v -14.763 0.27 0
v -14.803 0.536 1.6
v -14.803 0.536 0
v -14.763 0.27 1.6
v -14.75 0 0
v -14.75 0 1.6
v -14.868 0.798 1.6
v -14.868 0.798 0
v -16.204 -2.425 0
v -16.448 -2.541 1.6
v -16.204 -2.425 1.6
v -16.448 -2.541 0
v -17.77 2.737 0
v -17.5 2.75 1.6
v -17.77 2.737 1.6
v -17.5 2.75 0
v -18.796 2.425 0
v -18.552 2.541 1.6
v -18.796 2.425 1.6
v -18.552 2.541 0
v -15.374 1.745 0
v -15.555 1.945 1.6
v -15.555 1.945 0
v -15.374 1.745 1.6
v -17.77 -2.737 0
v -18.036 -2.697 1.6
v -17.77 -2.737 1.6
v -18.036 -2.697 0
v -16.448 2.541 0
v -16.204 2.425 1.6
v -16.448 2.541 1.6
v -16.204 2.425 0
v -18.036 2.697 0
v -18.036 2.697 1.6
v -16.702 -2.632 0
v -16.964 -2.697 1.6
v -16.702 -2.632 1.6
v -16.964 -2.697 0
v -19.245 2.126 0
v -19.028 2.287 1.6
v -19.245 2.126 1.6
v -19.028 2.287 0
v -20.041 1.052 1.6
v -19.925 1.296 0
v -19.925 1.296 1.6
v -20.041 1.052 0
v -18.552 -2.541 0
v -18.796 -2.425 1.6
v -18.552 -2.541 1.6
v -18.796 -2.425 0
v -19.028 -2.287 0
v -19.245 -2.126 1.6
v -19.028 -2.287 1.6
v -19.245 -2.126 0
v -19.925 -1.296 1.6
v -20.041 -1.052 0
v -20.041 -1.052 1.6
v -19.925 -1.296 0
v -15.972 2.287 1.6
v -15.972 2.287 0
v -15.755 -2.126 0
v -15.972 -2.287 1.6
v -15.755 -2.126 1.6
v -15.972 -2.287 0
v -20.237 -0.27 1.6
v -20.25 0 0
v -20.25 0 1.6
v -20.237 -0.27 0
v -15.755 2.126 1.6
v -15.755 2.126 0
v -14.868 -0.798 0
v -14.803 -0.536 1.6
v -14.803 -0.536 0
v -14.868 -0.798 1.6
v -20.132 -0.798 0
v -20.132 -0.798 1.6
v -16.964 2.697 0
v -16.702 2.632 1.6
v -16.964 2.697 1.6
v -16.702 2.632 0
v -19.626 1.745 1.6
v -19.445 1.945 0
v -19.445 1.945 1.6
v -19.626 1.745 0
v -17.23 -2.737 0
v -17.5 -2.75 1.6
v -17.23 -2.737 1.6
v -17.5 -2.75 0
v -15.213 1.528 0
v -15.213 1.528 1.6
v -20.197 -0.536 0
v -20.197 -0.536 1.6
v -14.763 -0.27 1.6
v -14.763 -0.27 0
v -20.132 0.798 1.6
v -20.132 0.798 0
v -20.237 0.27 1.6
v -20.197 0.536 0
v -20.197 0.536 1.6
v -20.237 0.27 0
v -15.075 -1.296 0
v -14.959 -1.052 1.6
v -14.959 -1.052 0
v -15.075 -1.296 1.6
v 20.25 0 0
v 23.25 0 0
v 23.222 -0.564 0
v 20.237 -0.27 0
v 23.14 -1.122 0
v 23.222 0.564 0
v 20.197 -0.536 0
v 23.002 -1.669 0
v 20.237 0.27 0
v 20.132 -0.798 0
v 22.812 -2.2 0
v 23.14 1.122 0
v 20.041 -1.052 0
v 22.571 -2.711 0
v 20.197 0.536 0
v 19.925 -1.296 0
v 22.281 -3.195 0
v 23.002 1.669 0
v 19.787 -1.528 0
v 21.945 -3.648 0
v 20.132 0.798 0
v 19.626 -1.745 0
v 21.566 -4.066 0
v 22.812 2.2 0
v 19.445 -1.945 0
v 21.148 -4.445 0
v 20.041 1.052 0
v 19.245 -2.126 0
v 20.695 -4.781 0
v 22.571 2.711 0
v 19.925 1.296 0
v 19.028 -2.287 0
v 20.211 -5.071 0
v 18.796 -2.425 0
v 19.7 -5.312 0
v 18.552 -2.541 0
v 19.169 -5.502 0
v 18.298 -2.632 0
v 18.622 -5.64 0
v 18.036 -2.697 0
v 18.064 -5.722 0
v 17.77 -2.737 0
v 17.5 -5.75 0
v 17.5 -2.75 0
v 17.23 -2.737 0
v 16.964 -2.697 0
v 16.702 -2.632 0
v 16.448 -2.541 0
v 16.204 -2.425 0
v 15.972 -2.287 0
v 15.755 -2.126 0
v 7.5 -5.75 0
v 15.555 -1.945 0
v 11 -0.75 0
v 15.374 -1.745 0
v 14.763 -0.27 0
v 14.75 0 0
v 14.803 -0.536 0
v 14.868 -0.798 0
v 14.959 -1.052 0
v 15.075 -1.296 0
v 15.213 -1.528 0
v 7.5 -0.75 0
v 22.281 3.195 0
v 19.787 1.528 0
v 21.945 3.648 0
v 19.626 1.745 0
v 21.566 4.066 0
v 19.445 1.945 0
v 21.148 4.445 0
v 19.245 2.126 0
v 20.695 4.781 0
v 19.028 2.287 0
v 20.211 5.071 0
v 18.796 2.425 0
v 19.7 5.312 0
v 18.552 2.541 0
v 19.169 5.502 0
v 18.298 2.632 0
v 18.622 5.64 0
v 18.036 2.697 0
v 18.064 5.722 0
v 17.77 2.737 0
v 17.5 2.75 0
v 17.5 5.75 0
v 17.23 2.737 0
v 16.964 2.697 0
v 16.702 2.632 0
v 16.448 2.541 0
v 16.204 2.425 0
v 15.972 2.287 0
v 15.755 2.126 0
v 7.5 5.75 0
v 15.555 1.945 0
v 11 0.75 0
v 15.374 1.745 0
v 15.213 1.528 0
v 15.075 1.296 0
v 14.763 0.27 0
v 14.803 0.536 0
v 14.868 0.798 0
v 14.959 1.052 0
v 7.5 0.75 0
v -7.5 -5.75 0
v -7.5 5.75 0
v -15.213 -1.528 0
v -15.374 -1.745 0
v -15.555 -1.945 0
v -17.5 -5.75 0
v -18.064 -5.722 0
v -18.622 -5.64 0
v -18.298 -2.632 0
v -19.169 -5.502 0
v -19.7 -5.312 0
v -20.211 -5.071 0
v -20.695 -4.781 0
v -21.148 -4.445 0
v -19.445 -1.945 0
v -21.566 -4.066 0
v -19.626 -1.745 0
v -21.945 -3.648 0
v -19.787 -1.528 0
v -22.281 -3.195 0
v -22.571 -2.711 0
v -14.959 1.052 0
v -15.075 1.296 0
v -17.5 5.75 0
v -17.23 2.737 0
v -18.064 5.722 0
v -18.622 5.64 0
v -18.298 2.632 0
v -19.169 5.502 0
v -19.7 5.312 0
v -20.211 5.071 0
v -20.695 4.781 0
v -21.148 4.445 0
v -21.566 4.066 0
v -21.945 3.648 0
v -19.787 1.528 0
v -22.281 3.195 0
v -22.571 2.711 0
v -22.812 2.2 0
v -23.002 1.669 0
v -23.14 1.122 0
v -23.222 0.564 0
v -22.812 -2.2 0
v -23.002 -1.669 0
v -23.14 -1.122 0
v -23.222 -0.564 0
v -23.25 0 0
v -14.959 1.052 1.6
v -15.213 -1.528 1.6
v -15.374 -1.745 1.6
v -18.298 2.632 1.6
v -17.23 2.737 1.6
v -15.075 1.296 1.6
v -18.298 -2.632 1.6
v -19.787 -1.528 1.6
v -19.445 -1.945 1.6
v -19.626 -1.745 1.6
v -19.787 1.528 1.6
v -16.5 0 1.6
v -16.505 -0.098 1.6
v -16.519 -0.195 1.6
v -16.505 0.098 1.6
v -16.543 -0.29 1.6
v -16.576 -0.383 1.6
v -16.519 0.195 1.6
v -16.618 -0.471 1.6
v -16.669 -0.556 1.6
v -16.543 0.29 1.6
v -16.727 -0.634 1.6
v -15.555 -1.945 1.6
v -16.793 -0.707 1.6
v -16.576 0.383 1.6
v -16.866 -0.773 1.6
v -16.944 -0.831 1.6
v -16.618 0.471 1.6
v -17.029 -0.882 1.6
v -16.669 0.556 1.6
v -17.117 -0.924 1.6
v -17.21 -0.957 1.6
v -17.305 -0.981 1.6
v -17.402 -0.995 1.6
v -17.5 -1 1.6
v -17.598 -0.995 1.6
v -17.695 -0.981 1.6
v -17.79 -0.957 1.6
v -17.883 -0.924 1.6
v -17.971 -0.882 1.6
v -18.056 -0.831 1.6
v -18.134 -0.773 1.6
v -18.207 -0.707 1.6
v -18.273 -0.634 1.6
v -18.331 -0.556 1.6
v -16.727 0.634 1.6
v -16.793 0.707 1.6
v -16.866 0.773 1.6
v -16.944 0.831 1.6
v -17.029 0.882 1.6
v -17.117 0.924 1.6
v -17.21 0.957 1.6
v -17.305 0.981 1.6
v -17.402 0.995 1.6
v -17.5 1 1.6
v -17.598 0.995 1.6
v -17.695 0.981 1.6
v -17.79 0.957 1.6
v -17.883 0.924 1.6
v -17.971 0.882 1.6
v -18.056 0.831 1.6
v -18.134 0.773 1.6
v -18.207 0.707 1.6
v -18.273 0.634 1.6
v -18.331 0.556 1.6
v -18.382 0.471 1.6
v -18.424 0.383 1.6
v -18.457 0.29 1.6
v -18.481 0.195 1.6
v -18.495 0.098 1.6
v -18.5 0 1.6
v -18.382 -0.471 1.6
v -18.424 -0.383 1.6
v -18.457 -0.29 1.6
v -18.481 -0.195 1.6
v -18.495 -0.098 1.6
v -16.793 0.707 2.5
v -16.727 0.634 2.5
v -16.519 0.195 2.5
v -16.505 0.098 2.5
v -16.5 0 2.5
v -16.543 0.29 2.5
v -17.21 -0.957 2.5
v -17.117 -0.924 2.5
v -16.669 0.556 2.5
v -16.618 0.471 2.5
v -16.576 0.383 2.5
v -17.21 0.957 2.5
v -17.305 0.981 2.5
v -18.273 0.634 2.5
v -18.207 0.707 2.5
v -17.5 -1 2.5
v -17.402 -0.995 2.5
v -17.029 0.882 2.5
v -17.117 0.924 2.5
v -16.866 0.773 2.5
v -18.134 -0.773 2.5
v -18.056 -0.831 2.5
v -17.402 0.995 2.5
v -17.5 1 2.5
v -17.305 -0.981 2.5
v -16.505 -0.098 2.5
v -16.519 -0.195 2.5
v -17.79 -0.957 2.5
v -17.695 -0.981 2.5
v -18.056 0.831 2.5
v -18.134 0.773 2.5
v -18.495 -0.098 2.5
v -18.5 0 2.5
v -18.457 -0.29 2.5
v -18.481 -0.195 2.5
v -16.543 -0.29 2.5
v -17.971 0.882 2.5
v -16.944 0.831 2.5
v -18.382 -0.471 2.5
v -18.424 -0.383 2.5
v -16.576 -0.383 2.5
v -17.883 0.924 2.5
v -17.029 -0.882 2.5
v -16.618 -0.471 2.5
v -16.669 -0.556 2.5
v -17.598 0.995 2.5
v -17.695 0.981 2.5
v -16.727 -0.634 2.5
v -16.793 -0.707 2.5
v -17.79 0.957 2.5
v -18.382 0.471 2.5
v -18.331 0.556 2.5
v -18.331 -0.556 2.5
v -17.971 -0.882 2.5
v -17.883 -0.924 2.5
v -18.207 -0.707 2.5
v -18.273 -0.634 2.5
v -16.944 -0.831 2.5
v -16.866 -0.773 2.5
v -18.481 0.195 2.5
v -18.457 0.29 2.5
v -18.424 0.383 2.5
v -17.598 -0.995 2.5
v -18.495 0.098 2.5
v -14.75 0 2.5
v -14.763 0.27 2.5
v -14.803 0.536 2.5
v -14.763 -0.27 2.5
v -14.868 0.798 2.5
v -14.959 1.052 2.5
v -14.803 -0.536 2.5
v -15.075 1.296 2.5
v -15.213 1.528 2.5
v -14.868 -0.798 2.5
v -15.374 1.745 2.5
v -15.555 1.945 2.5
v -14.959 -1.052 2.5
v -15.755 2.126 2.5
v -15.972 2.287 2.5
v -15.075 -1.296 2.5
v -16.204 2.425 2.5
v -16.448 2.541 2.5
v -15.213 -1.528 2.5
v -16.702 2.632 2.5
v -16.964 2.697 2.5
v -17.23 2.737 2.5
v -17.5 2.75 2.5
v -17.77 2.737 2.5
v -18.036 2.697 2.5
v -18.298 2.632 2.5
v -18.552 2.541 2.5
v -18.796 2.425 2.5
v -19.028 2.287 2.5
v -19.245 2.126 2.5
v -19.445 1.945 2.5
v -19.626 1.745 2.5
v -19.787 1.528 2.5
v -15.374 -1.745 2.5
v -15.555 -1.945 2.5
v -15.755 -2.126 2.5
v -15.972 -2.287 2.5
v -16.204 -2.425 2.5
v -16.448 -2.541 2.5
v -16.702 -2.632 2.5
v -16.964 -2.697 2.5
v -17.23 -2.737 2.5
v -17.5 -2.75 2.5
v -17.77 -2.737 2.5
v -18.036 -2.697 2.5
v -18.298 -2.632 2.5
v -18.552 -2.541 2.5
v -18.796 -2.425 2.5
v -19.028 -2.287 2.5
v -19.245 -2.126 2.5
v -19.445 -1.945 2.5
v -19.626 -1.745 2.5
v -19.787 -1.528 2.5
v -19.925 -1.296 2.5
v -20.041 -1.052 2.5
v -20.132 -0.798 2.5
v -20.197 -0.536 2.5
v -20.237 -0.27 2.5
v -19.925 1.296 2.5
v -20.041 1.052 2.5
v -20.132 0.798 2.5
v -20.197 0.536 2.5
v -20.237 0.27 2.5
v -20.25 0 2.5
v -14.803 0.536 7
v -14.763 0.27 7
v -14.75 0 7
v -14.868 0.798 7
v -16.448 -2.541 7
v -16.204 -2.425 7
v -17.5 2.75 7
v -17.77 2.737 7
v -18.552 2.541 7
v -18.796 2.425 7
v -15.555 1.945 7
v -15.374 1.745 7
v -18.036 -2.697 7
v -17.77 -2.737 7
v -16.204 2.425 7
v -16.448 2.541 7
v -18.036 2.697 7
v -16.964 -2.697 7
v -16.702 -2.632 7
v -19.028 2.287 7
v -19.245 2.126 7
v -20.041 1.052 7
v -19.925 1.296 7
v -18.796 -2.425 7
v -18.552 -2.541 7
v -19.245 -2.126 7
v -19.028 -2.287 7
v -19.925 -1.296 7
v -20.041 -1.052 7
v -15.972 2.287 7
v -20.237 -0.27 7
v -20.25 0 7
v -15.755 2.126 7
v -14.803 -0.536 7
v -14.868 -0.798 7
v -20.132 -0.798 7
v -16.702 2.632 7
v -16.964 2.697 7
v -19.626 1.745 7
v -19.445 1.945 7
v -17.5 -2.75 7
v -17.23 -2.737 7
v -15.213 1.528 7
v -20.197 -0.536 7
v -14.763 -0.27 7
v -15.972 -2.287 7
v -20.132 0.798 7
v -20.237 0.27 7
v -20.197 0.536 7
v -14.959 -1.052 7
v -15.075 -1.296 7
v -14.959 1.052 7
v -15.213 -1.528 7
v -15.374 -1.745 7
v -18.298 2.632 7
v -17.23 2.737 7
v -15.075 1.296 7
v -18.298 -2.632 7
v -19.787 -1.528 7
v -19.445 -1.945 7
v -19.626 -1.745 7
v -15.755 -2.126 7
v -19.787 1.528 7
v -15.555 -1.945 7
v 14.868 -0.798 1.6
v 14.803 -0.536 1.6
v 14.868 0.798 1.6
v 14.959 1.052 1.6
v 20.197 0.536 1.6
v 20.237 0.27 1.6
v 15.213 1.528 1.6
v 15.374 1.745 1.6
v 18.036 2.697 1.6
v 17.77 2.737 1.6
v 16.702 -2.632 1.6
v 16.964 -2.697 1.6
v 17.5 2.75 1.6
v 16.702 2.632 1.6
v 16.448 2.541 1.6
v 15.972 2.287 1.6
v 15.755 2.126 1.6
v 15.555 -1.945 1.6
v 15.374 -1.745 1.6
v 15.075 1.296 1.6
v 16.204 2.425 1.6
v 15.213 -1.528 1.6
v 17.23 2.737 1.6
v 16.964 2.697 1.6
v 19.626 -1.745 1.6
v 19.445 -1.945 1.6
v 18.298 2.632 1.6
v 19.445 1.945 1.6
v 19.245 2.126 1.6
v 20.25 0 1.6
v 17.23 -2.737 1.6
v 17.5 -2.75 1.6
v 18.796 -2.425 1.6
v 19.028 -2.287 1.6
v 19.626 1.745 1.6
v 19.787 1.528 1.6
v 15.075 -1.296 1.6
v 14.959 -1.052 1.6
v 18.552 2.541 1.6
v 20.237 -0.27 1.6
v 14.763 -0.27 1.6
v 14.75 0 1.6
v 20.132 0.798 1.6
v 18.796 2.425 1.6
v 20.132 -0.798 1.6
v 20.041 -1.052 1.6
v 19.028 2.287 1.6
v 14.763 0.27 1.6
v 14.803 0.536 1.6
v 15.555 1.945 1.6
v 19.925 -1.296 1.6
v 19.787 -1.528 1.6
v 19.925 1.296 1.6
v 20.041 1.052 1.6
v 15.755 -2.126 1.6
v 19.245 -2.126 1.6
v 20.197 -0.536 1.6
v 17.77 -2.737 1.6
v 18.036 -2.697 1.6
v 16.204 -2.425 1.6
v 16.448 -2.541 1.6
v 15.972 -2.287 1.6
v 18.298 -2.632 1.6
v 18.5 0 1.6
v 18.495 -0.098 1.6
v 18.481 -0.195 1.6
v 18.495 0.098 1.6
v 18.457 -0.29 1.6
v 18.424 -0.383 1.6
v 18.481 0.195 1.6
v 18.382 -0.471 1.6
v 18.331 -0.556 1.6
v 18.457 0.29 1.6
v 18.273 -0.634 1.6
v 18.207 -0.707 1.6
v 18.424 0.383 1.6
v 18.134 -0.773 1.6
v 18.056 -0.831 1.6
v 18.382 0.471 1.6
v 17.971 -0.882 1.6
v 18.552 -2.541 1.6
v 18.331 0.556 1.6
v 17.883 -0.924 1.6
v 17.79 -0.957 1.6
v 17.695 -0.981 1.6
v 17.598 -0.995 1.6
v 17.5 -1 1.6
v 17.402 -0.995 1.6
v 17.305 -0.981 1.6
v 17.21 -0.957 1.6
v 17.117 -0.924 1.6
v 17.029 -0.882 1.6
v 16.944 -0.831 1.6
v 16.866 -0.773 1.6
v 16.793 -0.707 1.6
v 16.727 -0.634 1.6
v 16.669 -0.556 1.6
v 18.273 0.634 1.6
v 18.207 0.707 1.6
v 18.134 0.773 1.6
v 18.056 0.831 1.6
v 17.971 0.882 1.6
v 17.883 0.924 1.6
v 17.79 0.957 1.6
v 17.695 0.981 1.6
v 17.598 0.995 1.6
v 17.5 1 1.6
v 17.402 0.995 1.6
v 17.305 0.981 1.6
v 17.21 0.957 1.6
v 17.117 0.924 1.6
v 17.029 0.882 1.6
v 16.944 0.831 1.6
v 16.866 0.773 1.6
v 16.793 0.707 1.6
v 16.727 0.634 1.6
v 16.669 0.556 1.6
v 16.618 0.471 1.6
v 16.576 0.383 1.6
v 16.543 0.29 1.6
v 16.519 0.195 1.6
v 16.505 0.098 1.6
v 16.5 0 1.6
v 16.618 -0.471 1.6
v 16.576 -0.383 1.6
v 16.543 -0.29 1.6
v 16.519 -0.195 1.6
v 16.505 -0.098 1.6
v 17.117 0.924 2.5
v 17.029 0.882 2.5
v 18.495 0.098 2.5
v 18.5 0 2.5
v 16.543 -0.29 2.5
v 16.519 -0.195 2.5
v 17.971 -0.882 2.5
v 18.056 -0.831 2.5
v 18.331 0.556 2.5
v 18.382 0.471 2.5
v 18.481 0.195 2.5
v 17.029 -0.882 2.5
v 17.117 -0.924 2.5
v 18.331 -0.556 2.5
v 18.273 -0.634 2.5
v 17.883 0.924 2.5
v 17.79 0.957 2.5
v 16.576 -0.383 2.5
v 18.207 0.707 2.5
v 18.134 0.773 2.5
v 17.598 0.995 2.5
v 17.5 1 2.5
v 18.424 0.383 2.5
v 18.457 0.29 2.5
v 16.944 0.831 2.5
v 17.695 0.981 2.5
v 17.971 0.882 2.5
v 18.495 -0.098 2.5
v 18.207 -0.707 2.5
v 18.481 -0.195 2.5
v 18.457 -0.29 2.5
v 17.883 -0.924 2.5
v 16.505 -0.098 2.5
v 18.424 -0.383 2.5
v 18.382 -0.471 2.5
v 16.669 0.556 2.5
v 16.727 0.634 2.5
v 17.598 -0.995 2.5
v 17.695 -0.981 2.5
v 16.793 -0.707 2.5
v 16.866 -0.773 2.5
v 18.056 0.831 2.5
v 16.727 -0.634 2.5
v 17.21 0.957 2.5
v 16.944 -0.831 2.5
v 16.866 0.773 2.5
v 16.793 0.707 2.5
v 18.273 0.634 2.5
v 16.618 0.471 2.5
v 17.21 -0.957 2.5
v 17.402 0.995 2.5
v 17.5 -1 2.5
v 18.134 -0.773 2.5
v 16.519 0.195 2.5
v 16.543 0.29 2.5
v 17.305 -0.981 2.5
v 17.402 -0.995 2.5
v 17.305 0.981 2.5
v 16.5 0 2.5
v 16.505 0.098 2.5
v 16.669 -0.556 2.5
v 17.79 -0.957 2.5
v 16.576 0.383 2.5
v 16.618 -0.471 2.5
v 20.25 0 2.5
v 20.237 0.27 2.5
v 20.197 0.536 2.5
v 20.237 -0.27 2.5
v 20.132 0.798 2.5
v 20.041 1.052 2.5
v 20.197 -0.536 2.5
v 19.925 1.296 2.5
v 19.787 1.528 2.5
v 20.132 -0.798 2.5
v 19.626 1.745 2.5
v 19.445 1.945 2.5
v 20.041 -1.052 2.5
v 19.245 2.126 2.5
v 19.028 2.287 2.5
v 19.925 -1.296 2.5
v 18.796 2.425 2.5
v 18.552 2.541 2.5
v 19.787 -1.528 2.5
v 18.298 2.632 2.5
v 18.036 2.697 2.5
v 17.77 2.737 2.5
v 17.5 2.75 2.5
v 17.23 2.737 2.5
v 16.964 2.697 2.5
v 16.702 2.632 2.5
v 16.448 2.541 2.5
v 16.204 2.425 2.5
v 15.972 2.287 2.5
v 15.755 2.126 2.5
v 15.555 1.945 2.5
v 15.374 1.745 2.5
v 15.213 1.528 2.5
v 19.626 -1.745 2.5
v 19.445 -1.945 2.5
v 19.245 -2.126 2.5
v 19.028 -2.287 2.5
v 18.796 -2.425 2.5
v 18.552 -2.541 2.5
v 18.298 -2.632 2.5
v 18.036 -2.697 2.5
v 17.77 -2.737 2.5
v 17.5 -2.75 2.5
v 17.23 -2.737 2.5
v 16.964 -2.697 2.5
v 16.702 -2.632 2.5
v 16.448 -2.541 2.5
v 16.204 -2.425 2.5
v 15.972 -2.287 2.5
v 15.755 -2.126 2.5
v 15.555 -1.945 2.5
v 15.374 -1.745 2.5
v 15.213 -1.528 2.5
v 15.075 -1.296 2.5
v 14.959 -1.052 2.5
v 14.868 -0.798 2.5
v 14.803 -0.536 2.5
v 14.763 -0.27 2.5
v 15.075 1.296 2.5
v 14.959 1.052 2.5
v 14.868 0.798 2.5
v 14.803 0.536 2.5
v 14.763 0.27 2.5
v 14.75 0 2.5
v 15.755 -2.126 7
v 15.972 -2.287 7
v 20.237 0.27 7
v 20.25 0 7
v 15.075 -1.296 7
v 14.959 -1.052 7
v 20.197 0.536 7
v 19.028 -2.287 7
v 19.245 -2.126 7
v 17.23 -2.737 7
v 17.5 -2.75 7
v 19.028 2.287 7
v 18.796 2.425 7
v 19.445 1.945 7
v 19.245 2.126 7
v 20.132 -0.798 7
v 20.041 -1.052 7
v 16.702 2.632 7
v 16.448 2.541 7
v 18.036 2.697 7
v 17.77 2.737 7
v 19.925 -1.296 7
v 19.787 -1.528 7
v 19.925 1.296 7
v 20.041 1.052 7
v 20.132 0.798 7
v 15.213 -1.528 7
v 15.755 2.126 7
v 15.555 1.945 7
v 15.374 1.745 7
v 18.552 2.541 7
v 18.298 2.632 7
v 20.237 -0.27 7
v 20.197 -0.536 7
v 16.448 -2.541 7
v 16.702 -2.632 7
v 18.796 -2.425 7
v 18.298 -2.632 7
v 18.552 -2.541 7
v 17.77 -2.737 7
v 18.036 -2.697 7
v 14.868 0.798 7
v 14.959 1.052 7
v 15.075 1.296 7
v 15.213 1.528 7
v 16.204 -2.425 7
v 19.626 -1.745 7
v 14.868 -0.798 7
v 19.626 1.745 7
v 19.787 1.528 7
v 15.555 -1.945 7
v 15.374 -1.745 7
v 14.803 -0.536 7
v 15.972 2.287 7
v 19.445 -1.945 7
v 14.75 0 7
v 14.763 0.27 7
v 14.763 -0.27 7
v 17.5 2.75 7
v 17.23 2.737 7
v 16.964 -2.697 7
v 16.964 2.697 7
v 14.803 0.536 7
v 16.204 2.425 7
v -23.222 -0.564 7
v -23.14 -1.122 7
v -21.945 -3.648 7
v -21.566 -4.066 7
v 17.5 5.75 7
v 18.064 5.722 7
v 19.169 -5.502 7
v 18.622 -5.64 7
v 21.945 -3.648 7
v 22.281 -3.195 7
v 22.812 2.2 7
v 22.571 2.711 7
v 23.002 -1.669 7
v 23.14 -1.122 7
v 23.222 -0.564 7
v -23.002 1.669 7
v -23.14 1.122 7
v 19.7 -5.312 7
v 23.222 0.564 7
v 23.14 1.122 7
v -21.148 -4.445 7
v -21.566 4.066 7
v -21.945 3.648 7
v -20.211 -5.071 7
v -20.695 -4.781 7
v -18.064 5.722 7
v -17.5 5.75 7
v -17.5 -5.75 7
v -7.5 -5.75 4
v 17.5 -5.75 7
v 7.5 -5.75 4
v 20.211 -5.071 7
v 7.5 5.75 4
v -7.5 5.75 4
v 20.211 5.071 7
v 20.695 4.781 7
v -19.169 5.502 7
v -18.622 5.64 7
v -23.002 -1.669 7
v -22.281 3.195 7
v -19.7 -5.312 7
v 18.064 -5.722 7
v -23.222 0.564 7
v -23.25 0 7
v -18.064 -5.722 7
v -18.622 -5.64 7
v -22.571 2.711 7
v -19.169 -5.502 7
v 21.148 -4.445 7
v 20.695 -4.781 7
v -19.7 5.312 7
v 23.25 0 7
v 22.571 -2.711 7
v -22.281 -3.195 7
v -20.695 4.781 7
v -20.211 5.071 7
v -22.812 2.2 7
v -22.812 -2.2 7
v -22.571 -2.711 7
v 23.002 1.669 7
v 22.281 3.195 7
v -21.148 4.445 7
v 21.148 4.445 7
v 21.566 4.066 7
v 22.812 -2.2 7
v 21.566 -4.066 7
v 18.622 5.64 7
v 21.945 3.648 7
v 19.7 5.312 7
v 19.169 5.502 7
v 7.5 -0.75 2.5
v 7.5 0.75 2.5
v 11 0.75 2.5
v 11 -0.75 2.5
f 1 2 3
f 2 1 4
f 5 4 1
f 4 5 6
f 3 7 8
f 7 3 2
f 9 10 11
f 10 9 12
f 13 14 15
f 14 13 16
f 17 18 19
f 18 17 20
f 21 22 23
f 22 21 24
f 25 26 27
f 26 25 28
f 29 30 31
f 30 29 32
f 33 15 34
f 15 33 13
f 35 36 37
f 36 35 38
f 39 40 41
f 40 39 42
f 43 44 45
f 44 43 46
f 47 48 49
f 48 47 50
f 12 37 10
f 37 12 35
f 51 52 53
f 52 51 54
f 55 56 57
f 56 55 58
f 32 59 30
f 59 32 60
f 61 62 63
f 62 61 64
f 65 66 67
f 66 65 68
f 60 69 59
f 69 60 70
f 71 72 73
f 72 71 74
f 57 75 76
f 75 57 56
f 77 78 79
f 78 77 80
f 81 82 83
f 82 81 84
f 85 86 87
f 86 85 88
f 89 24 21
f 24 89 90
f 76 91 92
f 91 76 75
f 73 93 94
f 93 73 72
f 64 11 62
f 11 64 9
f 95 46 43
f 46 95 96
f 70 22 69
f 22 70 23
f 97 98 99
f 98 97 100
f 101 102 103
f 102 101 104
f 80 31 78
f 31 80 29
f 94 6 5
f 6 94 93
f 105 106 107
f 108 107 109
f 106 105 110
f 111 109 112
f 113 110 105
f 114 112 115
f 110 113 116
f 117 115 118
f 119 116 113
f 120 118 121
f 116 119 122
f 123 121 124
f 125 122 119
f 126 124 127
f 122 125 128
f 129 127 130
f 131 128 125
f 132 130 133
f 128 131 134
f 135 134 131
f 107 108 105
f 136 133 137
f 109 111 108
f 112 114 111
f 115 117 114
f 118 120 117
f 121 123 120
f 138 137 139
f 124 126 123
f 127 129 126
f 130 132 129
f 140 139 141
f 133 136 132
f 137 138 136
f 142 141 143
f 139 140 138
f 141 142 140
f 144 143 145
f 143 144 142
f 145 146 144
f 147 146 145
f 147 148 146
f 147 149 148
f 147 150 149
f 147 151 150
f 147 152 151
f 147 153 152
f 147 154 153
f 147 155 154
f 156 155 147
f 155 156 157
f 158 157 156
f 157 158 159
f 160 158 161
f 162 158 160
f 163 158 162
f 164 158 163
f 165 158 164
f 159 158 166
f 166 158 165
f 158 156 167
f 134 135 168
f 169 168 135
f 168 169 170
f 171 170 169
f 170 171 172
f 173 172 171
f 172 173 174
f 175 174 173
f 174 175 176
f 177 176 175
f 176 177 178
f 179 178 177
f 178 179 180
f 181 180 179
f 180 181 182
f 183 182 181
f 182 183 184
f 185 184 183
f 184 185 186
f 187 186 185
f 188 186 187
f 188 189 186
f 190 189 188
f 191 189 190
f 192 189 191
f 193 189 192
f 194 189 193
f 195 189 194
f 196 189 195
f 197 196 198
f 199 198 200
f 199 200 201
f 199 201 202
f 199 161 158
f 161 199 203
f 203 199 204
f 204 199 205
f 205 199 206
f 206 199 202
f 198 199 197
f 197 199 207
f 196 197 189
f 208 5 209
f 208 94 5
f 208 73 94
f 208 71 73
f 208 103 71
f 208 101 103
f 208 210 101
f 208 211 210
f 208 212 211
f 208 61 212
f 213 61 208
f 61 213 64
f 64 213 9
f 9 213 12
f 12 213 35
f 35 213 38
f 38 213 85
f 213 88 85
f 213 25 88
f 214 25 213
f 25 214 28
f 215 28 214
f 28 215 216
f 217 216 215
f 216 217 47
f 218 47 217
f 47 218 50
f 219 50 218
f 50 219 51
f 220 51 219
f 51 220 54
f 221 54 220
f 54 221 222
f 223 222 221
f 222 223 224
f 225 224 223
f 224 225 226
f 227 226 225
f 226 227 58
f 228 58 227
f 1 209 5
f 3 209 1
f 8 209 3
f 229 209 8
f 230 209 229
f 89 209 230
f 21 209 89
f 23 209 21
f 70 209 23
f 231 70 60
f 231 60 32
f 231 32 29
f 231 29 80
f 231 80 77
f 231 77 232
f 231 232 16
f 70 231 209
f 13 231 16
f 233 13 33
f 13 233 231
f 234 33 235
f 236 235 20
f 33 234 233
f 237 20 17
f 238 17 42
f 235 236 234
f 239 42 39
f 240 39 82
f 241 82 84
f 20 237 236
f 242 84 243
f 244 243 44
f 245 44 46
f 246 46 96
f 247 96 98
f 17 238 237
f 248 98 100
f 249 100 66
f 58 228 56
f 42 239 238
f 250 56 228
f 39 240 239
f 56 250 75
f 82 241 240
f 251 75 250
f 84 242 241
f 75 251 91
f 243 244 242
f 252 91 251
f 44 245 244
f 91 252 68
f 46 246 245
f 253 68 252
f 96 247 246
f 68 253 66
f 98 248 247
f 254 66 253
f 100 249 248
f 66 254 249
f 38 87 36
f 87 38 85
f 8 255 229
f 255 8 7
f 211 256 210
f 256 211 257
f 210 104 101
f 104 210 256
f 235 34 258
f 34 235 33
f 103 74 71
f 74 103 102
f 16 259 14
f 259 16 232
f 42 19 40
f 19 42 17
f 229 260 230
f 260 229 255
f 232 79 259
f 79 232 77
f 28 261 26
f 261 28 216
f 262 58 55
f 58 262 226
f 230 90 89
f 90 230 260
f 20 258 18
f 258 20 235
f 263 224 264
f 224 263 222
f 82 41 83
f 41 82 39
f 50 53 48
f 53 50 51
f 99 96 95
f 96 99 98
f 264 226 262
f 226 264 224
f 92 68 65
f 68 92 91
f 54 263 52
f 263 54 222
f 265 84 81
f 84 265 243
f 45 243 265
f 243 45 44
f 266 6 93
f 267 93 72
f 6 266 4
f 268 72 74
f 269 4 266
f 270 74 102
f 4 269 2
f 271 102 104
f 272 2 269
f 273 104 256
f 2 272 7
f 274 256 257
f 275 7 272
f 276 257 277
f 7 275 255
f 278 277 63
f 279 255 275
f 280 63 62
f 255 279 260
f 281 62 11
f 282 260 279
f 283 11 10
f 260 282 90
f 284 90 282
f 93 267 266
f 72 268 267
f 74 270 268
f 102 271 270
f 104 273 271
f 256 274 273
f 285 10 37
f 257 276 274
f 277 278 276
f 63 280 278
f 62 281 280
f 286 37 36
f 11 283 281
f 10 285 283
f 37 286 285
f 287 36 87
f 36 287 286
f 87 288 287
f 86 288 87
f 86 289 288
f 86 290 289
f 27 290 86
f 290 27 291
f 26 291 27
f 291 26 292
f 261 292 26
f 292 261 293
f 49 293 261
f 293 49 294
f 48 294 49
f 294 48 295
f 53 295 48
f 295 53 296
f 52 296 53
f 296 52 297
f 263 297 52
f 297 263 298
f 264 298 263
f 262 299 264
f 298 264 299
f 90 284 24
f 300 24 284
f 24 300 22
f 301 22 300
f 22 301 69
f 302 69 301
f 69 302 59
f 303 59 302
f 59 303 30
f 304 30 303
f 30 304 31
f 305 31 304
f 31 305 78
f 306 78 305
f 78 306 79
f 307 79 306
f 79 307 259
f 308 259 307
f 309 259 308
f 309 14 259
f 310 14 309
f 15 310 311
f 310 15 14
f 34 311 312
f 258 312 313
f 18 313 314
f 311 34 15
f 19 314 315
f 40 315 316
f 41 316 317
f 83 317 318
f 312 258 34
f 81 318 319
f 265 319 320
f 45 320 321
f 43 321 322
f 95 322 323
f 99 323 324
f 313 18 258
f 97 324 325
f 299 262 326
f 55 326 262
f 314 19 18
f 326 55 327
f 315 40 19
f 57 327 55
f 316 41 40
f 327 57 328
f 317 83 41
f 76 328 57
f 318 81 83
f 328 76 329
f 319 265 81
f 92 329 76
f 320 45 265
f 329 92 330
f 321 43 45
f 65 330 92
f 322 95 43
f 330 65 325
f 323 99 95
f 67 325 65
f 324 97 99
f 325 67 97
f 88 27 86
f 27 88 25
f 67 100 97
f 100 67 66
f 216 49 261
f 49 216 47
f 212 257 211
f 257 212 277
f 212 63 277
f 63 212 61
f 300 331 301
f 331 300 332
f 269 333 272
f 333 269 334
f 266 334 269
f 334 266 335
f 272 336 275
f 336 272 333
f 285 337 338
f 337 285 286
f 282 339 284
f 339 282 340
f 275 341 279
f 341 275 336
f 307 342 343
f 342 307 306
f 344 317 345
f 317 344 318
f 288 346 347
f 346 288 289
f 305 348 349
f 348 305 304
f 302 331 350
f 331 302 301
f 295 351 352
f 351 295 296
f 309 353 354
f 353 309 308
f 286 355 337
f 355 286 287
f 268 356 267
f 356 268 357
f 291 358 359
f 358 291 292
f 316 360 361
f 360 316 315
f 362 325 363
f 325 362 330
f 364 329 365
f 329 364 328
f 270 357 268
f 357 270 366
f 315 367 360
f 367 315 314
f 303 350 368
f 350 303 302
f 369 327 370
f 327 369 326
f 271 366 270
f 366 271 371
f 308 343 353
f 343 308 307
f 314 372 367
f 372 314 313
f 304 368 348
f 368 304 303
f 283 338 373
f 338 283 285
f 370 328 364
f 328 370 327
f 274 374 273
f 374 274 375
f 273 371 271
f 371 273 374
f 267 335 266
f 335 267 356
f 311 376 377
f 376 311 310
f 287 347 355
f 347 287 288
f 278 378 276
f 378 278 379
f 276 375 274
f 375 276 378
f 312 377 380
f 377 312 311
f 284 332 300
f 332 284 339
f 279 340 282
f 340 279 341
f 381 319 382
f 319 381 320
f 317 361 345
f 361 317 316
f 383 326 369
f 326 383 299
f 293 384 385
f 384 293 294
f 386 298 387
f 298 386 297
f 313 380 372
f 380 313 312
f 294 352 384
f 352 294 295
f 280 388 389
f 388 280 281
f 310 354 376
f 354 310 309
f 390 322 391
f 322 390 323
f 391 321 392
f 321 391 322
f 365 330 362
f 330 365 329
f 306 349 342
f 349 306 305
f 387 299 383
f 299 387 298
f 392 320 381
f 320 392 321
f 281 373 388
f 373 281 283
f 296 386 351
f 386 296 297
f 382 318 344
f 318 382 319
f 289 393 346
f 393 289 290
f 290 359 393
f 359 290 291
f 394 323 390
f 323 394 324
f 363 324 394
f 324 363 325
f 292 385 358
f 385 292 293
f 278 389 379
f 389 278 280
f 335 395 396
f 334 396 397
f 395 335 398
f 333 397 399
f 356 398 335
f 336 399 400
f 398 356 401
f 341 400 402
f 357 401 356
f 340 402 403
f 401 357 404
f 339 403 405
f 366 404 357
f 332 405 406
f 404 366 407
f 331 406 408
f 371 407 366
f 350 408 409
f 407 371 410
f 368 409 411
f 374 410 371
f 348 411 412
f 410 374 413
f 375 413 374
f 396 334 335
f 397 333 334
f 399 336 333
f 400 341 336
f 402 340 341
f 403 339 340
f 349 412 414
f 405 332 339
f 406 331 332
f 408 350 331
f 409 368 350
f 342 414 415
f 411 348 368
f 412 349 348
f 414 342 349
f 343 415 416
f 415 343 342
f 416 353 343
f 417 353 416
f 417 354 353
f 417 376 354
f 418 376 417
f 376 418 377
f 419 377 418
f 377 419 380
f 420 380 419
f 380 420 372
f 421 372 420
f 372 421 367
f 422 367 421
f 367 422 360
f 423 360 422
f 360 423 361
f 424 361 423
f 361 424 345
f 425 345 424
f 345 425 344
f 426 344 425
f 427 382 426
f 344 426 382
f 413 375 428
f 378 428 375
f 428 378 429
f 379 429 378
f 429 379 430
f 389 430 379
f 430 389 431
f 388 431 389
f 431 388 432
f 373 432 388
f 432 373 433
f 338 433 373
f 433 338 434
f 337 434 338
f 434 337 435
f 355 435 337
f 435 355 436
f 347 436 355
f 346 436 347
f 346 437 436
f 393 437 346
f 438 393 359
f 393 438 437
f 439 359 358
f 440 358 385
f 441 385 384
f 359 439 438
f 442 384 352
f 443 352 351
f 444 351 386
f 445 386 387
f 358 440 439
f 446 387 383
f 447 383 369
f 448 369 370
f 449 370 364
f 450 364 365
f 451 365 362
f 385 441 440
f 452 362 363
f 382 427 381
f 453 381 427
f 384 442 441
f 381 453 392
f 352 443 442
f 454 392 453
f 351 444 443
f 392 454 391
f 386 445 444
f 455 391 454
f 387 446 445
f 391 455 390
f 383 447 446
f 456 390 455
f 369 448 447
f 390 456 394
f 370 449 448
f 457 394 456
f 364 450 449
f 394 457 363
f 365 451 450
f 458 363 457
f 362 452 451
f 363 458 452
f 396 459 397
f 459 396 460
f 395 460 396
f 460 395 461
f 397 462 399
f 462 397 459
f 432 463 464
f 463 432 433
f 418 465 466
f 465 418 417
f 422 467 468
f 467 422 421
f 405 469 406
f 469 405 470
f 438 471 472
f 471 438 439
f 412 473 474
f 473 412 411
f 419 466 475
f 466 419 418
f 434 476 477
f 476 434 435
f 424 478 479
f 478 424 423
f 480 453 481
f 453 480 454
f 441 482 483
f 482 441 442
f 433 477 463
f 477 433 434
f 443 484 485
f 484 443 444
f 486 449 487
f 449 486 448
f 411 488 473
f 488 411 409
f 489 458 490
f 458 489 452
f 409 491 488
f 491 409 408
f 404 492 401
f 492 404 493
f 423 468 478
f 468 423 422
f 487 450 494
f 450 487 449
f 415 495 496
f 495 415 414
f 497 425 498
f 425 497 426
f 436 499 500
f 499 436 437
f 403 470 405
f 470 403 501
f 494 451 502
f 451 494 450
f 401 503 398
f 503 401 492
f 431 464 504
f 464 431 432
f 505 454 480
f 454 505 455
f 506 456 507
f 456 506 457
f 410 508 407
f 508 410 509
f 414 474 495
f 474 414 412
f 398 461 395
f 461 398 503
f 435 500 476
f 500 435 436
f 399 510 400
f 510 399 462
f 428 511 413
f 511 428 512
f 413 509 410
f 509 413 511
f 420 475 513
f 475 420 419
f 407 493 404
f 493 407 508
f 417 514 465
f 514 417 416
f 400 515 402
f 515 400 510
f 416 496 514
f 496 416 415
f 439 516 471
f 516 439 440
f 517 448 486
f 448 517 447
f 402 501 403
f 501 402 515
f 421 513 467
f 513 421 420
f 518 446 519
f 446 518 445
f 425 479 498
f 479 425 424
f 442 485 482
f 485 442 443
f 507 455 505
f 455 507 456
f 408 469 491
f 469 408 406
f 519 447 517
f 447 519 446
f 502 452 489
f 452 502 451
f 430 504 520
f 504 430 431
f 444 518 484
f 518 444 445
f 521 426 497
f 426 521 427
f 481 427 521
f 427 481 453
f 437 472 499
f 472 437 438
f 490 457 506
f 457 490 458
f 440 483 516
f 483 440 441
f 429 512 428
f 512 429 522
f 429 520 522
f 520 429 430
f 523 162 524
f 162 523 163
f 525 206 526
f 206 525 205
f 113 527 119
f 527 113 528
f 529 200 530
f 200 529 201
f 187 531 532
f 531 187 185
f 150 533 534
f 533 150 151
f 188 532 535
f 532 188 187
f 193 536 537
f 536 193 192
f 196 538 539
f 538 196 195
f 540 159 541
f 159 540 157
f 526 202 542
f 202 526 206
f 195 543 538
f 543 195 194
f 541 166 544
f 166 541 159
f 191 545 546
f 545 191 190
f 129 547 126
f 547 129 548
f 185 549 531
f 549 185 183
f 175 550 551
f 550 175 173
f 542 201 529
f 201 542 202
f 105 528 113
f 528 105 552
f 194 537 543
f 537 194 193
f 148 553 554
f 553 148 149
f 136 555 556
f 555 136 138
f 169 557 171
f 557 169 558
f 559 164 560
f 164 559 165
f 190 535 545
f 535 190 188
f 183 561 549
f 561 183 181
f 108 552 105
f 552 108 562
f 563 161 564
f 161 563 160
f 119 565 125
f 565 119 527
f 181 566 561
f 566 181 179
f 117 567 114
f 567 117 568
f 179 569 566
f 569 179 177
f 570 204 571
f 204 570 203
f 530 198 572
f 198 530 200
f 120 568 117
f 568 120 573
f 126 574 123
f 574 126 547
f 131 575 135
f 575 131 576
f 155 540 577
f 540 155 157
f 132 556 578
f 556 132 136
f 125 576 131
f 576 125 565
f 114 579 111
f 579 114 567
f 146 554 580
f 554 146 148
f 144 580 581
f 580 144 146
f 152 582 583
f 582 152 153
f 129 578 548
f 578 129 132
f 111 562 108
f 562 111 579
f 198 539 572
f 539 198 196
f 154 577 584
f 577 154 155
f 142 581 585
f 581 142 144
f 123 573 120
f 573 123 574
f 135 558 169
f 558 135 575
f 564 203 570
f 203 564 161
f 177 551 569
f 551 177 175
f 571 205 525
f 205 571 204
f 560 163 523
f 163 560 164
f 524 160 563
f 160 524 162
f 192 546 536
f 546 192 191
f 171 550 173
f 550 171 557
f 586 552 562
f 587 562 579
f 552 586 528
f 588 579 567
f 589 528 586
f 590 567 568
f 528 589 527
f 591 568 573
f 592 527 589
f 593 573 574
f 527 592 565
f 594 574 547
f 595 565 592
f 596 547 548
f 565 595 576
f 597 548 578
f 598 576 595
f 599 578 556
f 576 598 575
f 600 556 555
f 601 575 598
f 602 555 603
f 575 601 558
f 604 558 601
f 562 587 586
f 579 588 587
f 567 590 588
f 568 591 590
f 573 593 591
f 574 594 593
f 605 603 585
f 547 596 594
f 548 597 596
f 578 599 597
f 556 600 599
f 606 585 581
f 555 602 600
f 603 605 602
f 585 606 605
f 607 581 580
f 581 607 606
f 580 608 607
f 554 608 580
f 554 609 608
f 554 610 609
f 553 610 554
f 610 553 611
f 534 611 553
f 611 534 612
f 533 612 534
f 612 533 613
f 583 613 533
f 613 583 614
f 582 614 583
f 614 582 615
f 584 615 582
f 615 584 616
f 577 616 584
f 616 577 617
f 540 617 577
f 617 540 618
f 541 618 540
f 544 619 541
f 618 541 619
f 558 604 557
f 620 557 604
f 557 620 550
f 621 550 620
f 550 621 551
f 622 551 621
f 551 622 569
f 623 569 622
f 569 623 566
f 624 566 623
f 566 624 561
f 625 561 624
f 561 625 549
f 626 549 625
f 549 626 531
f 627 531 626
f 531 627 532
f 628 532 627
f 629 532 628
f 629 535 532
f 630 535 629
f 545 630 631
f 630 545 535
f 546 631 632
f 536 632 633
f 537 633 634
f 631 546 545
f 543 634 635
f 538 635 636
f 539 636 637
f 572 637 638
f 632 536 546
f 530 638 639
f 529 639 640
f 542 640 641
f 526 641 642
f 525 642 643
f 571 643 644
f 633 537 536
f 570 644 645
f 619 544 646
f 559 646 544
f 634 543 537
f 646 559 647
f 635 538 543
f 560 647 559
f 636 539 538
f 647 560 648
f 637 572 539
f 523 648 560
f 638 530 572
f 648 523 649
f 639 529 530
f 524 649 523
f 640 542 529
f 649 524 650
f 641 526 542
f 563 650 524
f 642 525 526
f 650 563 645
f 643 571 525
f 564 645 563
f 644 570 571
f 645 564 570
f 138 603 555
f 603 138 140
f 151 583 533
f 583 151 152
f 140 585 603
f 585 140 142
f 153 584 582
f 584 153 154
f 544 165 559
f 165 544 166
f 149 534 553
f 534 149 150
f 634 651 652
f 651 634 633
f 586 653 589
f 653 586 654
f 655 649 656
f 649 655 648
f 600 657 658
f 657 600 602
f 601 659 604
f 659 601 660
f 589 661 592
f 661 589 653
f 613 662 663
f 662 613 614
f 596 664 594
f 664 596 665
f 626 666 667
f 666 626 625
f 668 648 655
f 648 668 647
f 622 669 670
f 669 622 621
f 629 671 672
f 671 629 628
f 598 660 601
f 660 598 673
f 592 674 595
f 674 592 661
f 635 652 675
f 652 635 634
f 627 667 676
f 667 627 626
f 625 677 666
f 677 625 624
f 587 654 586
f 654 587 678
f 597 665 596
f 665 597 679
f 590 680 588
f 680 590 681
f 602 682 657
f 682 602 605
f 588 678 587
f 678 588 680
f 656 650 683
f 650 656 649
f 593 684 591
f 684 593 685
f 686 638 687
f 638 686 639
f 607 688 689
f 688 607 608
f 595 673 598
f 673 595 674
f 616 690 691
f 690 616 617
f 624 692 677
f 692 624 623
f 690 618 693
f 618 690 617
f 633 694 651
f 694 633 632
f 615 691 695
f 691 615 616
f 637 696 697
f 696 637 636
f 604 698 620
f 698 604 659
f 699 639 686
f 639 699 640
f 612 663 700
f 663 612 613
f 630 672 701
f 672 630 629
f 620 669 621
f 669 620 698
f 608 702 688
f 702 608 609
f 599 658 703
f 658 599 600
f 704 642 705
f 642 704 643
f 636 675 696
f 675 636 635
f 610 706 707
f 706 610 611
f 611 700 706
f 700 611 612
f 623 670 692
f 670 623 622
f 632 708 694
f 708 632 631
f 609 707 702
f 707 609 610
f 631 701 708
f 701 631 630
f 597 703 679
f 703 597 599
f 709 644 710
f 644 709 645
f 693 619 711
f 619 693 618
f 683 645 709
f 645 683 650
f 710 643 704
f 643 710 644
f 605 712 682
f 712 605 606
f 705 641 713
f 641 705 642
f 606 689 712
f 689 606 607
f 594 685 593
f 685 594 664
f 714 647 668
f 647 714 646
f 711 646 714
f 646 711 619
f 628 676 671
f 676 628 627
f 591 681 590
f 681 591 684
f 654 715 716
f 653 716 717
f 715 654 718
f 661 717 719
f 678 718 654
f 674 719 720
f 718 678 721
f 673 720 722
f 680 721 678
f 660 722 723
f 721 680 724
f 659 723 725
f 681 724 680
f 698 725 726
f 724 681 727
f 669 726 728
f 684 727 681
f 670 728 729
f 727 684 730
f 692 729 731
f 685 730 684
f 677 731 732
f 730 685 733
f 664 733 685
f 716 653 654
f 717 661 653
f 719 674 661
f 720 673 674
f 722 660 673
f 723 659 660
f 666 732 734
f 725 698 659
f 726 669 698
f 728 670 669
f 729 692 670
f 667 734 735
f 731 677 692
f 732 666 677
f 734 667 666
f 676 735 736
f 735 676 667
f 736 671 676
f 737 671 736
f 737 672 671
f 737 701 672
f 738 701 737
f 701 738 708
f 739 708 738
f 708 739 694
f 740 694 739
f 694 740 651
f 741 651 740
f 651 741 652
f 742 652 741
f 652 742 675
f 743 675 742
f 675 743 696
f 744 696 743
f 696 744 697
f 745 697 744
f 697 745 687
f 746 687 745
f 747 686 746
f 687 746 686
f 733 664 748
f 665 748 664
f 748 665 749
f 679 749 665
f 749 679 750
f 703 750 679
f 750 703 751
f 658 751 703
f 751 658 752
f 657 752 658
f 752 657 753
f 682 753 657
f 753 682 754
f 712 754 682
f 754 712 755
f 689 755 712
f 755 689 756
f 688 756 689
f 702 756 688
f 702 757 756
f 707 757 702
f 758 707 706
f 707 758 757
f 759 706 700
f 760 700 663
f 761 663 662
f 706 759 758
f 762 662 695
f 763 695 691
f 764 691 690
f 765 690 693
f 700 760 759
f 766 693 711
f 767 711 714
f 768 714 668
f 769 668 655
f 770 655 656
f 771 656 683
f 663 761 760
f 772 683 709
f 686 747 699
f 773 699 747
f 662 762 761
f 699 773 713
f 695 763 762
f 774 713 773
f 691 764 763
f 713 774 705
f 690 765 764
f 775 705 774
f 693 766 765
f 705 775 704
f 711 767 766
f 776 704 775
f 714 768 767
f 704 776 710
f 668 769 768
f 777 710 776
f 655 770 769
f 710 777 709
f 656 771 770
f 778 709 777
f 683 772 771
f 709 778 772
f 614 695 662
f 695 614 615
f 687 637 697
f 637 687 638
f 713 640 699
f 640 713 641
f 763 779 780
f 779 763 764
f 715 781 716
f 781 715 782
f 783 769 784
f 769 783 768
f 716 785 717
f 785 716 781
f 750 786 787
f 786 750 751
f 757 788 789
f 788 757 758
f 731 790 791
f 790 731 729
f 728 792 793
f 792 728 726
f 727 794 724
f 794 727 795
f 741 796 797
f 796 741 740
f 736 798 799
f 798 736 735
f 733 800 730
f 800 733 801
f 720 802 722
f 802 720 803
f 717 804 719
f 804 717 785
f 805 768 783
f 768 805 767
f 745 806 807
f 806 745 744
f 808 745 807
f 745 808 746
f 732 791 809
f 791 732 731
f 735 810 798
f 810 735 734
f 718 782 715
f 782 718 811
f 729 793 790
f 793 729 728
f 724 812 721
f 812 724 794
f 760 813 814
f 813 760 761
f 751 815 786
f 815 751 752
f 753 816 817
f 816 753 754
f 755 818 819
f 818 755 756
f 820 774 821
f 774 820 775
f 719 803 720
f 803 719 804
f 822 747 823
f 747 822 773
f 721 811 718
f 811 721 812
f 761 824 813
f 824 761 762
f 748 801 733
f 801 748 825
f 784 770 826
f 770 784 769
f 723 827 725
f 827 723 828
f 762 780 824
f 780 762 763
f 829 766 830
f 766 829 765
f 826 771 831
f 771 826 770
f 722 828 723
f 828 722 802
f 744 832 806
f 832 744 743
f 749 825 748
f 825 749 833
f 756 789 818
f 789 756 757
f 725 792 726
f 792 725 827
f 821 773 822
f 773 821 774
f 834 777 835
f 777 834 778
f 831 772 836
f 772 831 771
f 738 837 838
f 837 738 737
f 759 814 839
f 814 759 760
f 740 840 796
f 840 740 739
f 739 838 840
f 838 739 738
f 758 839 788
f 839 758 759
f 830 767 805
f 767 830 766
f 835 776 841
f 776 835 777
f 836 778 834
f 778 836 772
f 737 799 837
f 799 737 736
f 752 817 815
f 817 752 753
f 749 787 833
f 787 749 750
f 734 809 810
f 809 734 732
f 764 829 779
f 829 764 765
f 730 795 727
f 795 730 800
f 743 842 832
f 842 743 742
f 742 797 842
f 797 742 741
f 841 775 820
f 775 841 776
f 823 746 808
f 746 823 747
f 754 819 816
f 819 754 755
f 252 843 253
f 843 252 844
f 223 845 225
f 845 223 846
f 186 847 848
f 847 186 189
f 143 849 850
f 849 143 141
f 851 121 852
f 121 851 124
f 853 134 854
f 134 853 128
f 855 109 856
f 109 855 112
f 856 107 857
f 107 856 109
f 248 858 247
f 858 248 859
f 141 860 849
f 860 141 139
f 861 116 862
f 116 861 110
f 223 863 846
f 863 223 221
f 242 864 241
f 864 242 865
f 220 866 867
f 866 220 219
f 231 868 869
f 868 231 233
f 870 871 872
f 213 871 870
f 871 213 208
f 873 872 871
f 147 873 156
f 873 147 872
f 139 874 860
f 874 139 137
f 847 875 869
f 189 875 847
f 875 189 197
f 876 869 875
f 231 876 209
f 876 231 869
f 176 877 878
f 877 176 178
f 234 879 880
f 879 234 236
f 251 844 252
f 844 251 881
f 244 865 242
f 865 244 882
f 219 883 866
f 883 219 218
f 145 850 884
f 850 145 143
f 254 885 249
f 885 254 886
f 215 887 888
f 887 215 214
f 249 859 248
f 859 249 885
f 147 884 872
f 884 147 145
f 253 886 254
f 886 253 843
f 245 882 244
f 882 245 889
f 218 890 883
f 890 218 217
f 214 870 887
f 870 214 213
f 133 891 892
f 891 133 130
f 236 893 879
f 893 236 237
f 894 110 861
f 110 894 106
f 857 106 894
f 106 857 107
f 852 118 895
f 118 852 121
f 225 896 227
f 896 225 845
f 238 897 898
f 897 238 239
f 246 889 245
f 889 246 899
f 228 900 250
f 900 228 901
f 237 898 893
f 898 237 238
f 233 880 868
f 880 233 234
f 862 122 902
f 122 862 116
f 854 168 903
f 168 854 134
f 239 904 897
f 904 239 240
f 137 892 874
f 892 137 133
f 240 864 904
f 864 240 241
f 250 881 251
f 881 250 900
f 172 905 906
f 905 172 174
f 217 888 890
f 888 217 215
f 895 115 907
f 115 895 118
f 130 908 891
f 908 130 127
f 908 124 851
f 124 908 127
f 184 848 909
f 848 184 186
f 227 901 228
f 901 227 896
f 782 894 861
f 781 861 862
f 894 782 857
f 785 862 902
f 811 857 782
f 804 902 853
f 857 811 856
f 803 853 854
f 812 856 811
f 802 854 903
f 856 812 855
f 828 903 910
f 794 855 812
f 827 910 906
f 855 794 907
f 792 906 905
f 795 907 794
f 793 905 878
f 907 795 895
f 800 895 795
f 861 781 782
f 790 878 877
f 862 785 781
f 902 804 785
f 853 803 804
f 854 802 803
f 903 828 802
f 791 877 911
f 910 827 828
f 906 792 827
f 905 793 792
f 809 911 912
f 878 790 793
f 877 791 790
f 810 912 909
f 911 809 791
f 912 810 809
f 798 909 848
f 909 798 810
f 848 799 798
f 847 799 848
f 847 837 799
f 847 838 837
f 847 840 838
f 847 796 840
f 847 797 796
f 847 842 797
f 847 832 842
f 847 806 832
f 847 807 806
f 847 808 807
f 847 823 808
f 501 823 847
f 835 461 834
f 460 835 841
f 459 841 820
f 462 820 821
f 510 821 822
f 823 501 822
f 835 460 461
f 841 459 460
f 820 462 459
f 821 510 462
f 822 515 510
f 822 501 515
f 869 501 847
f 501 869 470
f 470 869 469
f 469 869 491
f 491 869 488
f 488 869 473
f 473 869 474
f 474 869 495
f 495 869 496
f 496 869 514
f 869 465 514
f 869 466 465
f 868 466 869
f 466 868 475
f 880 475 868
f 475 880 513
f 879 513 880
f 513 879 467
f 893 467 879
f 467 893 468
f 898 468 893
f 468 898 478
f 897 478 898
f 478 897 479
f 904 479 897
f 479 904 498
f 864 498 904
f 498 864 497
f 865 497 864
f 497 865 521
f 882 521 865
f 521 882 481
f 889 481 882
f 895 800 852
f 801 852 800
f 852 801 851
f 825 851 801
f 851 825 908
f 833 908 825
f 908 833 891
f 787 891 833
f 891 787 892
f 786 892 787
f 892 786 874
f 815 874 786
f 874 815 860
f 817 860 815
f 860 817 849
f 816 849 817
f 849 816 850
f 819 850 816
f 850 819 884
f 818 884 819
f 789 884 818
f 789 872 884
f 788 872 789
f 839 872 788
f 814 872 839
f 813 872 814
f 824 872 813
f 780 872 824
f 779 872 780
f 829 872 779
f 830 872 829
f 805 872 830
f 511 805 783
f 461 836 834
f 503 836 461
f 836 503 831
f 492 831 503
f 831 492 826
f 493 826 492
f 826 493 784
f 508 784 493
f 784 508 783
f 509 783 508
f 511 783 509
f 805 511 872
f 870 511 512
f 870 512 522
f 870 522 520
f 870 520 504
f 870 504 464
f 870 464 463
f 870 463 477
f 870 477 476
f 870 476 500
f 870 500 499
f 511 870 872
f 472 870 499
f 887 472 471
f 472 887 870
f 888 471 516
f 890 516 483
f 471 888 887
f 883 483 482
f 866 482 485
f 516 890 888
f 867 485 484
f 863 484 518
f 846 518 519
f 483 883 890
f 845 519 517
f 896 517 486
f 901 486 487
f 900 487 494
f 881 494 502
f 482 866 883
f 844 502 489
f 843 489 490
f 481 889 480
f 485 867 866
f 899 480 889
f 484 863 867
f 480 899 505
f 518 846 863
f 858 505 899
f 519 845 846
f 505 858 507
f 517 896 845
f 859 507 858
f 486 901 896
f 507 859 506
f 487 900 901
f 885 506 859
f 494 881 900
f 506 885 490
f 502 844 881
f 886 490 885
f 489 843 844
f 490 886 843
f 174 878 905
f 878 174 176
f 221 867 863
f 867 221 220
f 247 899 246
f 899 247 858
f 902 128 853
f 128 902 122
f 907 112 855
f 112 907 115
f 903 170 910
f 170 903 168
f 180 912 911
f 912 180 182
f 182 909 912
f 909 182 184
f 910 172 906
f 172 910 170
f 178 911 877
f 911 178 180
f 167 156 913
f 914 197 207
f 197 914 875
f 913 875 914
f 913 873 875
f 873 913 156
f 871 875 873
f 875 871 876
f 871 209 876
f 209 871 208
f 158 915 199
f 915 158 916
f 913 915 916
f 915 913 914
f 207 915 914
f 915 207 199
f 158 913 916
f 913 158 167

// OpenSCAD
// Walkie Talkie Carabiner Attachment Arch
// This arch attaches to a walkie talkie via two studs and provides
// a permanent carabiner attachment point.

// ============================================
// DIMENSIONS
// ============================================

// Basic pill shape dimensions
attachment_length = 46.5;    // Length of the walkie talkie attachment
attachment_width = 11.5;     // Width of the walkie talkie attachment
attachment_height = 7;       // Height/tall dimension (Z direction)
rounding_diameter = attachment_width; // Diameter of the rounding (matches width)

// Screw hole dimensions
stud_hole_diameter = 5.5;       // Bottom hole for stud (5mm wide)
stud_hole_depth = 1.6;        // Depth of stud hole (1.6mm)
screw_shaft_diameter = 2;     // Screw shaft diameter (2mm)
screw_head_diameter = 5.5;    // Screw head diameter (5.5mm)
screw_head_start = 2.5;         // Height where screw head starts (4mm from bottom)

// Arch cutout dimensions
arch_cutout_width = 15;   // Width of the arch cutout (Y direction)
arch_cutout_depth = 4;   // Depth of the arch cutout (Z direction, from bottom)

// Keying slot dimensions
keying_slot_y = 1.5;    // Width of the keying slot (Y direction, perpendicular to line)
keying_slot_z = 2.5;    // Depth of the keying slot (Z direction)
keying_slot_x = 3.5;  // Distance extending from cutout edge (X direction)

// Quality settings
$fn = 64;  // Number of fragments for circles/cylinders (higher = smoother, slower to render)


// ============================================
// MAIN ARCH MODEL
// ============================================
// Coordinate system:
// X: along the length (left to right)
// Y: width (front to back)
// Z: height/tall (upward)

module attachment_profile() {
    hull() {
        translate([-attachment_length/2 + rounding_diameter/2, 0])
            circle(d=rounding_diameter);

        translate([attachment_length/2 - rounding_diameter/2, 0])
            circle(d=rounding_diameter);
    }
}

// Create a pill-shaped prism with flat top and bottom faces.
difference() {
    linear_extrude(height=attachment_height)
        attachment_profile();
    
    // Left side screw hole
    translate([-attachment_length/2 + rounding_diameter/2, 0, 0]) {
        // Bottom stud hole (5mm diameter, 1.6mm deep)
        cylinder(h=stud_hole_depth, d=stud_hole_diameter);
        
        // Screw shaft (2mm diameter, from 1.6mm to 4mm)
        translate([0, 0, stud_hole_depth])
            cylinder(h=screw_head_start - stud_hole_depth, d=screw_shaft_diameter);
        
        // Screw head clearance (5.5mm diameter, from 4mm to top)
        translate([0, 0, screw_head_start])
            cylinder(h=attachment_height - screw_head_start + 0.1, d=screw_head_diameter);
    }
    
    // Right side screw hole
    translate([attachment_length/2 - rounding_diameter/2, 0, 0]) {
        // Bottom stud hole (5mm diameter, 1.6mm deep)
        cylinder(h=stud_hole_depth, d=stud_hole_diameter);
        
        // Screw shaft (2mm diameter, from 1.6mm to 4mm)
        translate([0, 0, stud_hole_depth])
            cylinder(h=screw_head_start - stud_hole_depth, d=screw_shaft_diameter);
        
        // Screw head clearance (5.5mm diameter, from 4mm to top)
        translate([0, 0, screw_head_start])
            cylinder(h=attachment_height - screw_head_start + 0.1, d=screw_head_diameter);
    }
    
    // Arch cutout - rectangular cutout in the middle
    // Centered between the screws (x=0), cuts across entire object
    translate([-arch_cutout_width/2, -attachment_width/2, 0])
        cube([arch_cutout_width, attachment_width, arch_cutout_depth]);

    translate([arch_cutout_width/2, -keying_slot_y/2, 0])
        cube([keying_slot_x, keying_slot_y, keying_slot_z]);
}
